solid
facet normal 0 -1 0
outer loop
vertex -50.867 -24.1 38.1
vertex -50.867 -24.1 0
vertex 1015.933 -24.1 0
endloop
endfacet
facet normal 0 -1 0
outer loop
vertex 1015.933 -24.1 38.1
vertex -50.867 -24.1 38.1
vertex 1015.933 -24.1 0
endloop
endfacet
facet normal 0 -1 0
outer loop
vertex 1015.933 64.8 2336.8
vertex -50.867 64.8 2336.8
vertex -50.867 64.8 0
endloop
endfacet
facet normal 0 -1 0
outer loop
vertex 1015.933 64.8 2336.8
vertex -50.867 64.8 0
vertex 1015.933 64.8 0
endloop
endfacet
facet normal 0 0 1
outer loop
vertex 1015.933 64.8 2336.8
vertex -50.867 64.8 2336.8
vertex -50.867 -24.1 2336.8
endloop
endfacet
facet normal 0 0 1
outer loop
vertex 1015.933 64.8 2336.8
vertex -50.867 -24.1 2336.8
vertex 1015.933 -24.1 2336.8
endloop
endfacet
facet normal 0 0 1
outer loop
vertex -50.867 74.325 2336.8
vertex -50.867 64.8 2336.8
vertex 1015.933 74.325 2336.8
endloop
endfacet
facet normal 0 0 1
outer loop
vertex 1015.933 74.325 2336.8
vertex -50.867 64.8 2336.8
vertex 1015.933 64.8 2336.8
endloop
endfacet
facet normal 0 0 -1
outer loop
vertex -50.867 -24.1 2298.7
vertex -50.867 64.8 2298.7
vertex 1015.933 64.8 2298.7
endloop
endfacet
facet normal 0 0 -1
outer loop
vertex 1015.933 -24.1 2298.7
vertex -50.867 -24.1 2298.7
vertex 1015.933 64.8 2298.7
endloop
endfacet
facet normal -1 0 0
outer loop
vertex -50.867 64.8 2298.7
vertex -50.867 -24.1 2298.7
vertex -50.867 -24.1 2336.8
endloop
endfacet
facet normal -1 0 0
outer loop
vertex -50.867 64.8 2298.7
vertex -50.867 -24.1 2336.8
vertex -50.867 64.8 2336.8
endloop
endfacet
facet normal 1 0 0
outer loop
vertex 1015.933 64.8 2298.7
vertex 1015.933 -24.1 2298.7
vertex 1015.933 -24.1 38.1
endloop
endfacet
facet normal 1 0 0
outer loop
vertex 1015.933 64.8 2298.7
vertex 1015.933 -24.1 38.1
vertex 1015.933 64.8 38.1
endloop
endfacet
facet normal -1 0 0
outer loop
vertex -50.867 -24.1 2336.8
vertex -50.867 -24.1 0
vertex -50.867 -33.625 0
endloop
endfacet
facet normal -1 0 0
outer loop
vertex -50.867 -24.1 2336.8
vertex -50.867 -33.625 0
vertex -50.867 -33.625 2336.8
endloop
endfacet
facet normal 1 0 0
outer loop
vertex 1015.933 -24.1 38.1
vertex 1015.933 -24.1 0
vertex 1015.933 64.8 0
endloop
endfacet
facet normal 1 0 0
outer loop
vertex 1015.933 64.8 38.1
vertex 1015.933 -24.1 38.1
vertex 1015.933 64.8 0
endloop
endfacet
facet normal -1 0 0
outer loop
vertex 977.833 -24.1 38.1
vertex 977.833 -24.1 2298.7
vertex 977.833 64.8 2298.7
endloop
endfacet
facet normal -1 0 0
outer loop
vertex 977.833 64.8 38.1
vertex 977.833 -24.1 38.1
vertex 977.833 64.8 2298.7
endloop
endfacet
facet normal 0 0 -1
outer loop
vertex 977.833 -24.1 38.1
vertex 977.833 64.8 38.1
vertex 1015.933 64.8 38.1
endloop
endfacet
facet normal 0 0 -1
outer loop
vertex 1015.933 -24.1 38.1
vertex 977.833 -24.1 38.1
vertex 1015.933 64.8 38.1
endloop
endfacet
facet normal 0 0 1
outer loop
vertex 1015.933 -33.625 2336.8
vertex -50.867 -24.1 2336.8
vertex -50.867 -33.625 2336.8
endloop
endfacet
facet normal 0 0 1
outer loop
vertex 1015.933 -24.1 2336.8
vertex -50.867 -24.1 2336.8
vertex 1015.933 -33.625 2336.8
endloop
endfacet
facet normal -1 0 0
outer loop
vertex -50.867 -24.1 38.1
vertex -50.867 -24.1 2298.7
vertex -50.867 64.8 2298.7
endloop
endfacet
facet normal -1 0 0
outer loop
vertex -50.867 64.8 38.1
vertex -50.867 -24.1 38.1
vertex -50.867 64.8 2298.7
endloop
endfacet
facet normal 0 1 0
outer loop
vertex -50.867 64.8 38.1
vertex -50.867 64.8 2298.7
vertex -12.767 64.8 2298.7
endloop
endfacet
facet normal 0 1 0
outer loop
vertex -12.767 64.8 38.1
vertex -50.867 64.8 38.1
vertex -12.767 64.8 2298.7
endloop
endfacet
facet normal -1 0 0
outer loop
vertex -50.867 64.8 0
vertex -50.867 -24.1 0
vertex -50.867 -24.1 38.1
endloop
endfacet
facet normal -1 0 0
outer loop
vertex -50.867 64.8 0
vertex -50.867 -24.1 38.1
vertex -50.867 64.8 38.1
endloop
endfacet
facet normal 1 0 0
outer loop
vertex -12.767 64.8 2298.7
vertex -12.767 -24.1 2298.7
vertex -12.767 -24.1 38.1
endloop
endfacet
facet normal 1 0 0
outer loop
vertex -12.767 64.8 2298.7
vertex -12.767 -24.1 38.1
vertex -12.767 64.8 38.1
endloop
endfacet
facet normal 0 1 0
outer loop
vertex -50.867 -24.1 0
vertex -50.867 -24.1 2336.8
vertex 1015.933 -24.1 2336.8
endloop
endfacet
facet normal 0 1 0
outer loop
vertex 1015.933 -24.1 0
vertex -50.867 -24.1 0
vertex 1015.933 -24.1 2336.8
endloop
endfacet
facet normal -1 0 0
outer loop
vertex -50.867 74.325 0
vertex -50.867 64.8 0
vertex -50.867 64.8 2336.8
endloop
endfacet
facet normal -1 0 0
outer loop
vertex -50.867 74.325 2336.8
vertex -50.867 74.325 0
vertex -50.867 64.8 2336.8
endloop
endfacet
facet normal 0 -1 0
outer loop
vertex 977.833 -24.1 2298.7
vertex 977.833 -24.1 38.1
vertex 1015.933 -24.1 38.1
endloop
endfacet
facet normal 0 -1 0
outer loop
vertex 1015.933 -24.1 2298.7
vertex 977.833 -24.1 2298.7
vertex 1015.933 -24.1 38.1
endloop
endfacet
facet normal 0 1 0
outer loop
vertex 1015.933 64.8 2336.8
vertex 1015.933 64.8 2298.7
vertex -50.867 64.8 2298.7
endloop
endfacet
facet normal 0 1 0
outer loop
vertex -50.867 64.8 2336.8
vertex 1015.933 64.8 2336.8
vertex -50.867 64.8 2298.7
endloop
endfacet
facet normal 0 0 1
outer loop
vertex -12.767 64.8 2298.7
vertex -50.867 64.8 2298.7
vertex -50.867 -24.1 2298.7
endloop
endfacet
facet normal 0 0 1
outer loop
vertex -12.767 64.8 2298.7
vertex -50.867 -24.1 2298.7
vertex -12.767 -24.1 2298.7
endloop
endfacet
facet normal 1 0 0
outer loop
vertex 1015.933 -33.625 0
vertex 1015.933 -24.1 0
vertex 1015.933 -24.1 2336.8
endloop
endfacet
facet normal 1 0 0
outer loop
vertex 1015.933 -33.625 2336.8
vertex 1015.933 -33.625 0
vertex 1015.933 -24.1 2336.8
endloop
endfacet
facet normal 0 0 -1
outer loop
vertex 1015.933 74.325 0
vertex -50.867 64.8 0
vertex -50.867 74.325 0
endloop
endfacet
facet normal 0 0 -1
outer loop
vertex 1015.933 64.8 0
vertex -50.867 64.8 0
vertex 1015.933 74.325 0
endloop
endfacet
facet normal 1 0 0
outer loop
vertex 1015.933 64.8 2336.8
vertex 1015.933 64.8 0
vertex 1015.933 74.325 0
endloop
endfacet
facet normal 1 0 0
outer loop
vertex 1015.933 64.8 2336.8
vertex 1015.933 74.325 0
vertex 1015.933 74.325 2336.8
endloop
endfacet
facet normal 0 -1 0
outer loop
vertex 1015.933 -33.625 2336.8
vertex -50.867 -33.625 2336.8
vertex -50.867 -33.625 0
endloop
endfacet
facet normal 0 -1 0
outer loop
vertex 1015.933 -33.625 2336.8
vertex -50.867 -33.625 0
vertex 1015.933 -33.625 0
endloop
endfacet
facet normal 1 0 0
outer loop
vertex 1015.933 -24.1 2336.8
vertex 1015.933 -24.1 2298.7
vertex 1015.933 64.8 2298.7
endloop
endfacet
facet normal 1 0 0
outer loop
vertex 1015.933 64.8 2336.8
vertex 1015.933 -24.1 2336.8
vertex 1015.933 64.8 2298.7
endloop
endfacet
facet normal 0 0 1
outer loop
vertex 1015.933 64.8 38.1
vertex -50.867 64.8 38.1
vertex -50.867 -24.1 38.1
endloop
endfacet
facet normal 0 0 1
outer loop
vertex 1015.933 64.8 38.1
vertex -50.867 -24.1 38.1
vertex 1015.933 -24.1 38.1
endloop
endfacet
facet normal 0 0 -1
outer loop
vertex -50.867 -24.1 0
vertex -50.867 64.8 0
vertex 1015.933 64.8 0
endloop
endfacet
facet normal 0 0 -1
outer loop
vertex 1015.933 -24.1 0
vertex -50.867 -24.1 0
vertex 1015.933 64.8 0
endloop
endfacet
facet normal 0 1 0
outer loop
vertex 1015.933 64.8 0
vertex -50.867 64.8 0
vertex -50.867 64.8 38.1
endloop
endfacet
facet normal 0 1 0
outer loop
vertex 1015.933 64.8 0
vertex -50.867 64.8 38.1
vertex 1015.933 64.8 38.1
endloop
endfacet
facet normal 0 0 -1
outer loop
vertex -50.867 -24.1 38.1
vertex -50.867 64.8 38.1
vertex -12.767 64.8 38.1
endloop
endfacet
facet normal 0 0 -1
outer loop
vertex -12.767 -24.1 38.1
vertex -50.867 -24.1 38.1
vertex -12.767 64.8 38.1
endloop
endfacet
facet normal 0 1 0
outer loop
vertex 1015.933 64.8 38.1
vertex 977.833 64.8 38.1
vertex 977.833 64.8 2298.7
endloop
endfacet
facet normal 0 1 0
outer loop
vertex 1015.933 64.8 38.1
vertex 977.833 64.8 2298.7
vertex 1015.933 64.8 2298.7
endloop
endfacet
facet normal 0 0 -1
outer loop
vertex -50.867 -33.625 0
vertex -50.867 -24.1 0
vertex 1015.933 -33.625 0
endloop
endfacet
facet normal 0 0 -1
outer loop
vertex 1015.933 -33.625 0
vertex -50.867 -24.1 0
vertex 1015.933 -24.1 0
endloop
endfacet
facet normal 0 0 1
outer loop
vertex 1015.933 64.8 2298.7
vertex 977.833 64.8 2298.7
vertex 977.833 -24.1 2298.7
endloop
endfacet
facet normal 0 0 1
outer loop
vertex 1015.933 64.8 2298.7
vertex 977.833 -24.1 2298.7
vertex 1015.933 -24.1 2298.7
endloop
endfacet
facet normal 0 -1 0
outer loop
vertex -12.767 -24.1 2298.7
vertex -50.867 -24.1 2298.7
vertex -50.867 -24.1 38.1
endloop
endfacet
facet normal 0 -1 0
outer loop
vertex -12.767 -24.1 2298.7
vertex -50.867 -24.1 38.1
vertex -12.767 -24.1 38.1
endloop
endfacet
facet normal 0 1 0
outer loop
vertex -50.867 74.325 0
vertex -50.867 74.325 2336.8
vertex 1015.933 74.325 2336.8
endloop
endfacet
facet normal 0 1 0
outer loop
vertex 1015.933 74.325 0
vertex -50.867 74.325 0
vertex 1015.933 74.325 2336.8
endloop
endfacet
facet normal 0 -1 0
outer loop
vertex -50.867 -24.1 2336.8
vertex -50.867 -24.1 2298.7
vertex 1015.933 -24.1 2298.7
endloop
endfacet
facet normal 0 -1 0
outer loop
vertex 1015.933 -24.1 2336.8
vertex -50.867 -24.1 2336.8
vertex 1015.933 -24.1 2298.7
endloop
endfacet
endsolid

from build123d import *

# Parameters (mm, degrees)
F0_W     = 1066.8
F0_H     = 88.9
F1_DEPTH = 38.1
F2_W     = 38.1
F2_H     = 88.9
F3_DEPTH = 2260.6
F4_W     = 38.1
F4_H     = 88.9
F4_W_2   = 1028.7
F5_DEPTH = 38.1
F6_W     = 1066.8
F6_H     = 2336.8
F7_DEPTH = 9.525


with BuildPart() as f1:
    # F0 (on Top) → F1 (new body)
    with BuildSketch(Plane.XY):
        with Locations((482.5330347955, 20.3500167251)):
            Rectangle(F0_W, F0_H)
    extrude(amount=F1_DEPTH)


with BuildPart() as f3:
    # F2 (on face) → F3 (new body)
    with BuildSketch(Plane.XY.offset(38.1)):
        with Locations((-31.8169652045, 20.3500167251)):
            Rectangle(F2_W, F2_H)
    extrude(amount=F3_DEPTH)


with BuildPart() as f3b:
    # F2 (on face) → F3, piece 2 (new body)
    with BuildSketch(Plane.XY.offset(38.1)):
        with Locations((996.8830347955, 20.3500167251)):
            Rectangle(F2_W, F2_H)
    extrude(amount=F3_DEPTH)


with BuildPart() as f5:
    # F4 (on face) → F5 (new body)
    with BuildSketch(Plane.XY.offset(2298.7)):
        with Locations((-31.8169652045, 20.3500167251)):
            Rectangle(F4_W, F4_H)
        with Locations((501.5830347955, 20.3500167251)):
            Rectangle(F4_W_2, F4_H)
    extrude(amount=F5_DEPTH)


with BuildPart() as f7:
    # F6 (on face) → F7 (new body)
    with BuildSketch(Plane.XZ.offset(24.0999832749)):
        with Locations((482.5330347955, 1168.4)):
            Rectangle(F6_W, F6_H)
    extrude(amount=F7_DEPTH)


with BuildPart() as f12_1:
    # F12: instance of F7
    add(f7.part.mirror(Plane(origin=(-50.8669652045, 20.3500167251, 2336.8), x_dir=(0, 0, -1), z_dir=(0, 1, 0))))


solid = Compound([f1.part, f3.part, f3b.part, f5.part, f7.part, f12_1.part])
